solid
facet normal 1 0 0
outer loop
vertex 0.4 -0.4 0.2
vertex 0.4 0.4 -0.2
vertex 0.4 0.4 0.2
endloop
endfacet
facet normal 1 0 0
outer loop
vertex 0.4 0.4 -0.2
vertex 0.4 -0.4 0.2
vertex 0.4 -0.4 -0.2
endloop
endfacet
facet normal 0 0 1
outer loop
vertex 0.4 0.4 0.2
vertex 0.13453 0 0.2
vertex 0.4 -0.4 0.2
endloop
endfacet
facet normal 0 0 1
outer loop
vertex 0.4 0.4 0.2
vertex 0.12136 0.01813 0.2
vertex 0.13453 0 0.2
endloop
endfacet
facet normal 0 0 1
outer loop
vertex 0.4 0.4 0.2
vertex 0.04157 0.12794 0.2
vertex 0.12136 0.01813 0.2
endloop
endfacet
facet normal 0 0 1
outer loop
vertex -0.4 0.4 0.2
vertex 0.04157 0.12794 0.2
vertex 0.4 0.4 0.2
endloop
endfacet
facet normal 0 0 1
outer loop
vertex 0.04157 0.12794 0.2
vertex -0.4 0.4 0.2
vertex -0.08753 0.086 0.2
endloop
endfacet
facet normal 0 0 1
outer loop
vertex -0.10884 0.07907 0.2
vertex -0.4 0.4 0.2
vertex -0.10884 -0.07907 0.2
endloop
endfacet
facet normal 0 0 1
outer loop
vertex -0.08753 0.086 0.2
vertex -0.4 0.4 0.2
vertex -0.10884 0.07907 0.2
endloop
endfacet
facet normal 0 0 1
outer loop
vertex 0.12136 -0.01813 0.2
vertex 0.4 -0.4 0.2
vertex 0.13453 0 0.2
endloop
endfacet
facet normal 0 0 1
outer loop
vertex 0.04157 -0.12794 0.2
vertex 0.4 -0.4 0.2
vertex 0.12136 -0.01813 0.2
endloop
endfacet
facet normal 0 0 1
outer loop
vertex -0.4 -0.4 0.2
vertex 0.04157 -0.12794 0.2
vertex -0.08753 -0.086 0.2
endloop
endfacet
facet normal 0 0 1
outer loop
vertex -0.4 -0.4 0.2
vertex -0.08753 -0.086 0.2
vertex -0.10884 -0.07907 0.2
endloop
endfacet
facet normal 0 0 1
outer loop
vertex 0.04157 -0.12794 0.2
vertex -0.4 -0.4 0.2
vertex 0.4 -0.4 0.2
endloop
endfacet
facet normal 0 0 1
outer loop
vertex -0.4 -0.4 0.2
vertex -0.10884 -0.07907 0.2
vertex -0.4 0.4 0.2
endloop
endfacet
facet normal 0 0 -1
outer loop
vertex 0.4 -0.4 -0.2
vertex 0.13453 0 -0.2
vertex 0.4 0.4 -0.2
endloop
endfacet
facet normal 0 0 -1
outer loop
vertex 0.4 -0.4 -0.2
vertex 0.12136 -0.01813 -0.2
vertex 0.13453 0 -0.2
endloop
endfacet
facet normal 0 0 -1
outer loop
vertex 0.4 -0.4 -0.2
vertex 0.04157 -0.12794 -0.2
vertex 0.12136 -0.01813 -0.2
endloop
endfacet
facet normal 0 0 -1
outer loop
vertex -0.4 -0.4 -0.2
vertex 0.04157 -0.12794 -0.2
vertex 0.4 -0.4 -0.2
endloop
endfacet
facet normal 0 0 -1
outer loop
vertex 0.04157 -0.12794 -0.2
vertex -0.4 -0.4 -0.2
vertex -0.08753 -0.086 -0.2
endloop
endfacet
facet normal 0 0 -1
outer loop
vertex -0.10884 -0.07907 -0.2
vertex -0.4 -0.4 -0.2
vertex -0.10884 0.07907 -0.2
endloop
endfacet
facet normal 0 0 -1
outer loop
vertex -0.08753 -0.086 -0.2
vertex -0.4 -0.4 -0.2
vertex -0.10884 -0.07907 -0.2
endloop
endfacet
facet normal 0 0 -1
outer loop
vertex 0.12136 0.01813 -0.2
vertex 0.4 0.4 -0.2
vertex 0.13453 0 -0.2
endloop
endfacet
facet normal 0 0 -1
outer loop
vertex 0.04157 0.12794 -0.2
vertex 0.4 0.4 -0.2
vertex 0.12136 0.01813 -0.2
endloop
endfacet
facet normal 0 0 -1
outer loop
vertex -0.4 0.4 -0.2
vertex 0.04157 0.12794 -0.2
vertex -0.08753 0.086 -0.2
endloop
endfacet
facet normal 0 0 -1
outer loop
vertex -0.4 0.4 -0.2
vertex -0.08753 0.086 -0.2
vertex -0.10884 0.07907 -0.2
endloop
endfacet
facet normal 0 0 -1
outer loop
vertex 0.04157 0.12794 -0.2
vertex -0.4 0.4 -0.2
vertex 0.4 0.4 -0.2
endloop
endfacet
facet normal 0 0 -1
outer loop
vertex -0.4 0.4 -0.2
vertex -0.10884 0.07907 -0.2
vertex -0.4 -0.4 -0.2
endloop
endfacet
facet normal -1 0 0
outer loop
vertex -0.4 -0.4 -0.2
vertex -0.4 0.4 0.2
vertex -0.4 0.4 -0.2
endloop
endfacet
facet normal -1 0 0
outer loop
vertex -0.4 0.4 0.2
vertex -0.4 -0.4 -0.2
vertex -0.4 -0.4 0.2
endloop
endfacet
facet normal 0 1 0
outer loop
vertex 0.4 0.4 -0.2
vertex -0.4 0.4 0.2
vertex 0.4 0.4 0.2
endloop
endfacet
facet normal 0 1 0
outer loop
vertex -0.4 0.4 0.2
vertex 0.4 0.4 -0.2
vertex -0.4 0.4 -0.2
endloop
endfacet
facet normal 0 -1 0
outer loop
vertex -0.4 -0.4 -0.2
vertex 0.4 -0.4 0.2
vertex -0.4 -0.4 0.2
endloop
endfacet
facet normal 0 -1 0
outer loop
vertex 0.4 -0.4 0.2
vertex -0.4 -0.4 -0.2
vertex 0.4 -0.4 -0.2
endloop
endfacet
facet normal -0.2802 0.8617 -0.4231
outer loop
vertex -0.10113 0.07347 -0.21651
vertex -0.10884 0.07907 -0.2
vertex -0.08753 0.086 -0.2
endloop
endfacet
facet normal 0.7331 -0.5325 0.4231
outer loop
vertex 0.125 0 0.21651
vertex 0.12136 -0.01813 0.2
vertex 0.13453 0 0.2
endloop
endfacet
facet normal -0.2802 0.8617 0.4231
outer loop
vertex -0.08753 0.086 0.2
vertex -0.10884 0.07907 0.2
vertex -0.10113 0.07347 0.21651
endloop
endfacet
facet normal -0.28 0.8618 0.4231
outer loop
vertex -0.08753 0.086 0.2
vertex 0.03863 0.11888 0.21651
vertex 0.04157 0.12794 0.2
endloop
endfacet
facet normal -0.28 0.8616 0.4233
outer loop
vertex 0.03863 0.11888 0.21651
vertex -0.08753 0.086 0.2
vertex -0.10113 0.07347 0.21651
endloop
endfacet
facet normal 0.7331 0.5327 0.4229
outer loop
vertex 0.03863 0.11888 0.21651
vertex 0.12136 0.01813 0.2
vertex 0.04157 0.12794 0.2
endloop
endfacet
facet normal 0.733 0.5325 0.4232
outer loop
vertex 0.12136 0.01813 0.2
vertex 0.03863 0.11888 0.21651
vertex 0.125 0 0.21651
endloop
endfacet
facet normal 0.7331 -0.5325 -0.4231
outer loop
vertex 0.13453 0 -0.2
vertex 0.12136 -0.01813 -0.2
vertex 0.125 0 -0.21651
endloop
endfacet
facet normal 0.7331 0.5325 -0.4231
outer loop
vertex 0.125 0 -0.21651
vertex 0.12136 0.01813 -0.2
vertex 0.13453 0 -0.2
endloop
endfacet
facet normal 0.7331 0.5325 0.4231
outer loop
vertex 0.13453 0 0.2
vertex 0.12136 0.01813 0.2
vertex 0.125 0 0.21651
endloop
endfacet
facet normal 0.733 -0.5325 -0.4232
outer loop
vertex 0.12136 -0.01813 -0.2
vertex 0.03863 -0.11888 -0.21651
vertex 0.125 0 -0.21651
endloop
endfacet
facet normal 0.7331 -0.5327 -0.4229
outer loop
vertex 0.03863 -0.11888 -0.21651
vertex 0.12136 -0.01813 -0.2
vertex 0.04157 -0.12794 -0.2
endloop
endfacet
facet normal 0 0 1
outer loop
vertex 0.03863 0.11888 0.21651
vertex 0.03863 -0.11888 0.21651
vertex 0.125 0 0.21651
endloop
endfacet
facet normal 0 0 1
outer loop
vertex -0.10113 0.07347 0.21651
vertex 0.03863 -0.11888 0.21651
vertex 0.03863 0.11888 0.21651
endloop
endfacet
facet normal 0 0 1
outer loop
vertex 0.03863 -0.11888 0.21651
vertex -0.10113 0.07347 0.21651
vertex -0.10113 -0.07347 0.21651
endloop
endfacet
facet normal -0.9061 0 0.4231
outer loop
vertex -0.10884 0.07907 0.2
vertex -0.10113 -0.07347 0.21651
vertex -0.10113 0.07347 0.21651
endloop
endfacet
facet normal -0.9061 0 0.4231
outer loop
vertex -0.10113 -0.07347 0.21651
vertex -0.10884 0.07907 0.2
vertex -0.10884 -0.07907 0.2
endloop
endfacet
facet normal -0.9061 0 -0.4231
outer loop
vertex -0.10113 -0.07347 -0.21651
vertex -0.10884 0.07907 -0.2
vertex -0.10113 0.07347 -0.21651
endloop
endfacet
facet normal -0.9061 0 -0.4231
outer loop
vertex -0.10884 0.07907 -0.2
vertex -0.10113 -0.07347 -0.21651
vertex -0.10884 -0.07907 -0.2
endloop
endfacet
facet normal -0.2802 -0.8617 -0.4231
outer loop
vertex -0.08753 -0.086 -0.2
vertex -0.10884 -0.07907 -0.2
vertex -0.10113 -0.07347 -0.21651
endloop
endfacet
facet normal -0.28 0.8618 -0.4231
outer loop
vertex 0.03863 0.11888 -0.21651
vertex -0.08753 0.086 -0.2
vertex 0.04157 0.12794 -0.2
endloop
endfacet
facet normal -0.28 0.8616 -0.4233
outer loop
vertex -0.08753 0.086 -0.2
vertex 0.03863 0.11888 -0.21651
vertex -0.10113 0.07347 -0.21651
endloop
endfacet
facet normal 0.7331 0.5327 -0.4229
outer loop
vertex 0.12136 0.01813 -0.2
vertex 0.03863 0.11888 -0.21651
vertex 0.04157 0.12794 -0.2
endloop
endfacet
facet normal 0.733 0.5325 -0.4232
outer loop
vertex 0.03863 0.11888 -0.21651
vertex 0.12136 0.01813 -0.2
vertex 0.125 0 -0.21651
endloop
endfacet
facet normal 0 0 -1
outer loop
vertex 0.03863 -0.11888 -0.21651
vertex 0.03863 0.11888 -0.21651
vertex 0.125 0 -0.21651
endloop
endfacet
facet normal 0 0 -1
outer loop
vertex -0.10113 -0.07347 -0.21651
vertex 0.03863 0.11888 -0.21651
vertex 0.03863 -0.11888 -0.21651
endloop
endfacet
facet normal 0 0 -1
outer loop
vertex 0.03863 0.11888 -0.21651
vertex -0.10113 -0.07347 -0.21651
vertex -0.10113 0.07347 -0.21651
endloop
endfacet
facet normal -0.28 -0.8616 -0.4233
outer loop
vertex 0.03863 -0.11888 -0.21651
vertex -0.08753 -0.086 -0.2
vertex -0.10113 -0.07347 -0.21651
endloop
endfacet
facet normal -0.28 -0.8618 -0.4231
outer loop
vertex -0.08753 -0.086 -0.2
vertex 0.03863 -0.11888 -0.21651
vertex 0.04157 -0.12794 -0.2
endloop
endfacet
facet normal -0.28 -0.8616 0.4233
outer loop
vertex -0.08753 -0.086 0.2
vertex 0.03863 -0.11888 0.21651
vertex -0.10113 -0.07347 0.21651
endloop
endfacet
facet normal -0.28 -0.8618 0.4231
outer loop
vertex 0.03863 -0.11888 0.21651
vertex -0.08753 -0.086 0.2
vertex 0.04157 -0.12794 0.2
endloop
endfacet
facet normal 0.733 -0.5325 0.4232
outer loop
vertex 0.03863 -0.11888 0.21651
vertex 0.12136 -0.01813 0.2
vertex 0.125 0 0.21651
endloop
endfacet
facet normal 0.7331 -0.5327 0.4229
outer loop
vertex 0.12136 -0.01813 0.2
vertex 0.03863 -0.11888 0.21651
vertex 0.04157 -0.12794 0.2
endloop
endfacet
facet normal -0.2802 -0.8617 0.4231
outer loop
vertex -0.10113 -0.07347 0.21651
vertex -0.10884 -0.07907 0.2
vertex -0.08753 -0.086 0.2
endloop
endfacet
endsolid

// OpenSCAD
// Native subset primitive fixture.
union() {
  cube([0.8, 0.8, 0.4], center = true);
  sphere(r = 0.25);
}
